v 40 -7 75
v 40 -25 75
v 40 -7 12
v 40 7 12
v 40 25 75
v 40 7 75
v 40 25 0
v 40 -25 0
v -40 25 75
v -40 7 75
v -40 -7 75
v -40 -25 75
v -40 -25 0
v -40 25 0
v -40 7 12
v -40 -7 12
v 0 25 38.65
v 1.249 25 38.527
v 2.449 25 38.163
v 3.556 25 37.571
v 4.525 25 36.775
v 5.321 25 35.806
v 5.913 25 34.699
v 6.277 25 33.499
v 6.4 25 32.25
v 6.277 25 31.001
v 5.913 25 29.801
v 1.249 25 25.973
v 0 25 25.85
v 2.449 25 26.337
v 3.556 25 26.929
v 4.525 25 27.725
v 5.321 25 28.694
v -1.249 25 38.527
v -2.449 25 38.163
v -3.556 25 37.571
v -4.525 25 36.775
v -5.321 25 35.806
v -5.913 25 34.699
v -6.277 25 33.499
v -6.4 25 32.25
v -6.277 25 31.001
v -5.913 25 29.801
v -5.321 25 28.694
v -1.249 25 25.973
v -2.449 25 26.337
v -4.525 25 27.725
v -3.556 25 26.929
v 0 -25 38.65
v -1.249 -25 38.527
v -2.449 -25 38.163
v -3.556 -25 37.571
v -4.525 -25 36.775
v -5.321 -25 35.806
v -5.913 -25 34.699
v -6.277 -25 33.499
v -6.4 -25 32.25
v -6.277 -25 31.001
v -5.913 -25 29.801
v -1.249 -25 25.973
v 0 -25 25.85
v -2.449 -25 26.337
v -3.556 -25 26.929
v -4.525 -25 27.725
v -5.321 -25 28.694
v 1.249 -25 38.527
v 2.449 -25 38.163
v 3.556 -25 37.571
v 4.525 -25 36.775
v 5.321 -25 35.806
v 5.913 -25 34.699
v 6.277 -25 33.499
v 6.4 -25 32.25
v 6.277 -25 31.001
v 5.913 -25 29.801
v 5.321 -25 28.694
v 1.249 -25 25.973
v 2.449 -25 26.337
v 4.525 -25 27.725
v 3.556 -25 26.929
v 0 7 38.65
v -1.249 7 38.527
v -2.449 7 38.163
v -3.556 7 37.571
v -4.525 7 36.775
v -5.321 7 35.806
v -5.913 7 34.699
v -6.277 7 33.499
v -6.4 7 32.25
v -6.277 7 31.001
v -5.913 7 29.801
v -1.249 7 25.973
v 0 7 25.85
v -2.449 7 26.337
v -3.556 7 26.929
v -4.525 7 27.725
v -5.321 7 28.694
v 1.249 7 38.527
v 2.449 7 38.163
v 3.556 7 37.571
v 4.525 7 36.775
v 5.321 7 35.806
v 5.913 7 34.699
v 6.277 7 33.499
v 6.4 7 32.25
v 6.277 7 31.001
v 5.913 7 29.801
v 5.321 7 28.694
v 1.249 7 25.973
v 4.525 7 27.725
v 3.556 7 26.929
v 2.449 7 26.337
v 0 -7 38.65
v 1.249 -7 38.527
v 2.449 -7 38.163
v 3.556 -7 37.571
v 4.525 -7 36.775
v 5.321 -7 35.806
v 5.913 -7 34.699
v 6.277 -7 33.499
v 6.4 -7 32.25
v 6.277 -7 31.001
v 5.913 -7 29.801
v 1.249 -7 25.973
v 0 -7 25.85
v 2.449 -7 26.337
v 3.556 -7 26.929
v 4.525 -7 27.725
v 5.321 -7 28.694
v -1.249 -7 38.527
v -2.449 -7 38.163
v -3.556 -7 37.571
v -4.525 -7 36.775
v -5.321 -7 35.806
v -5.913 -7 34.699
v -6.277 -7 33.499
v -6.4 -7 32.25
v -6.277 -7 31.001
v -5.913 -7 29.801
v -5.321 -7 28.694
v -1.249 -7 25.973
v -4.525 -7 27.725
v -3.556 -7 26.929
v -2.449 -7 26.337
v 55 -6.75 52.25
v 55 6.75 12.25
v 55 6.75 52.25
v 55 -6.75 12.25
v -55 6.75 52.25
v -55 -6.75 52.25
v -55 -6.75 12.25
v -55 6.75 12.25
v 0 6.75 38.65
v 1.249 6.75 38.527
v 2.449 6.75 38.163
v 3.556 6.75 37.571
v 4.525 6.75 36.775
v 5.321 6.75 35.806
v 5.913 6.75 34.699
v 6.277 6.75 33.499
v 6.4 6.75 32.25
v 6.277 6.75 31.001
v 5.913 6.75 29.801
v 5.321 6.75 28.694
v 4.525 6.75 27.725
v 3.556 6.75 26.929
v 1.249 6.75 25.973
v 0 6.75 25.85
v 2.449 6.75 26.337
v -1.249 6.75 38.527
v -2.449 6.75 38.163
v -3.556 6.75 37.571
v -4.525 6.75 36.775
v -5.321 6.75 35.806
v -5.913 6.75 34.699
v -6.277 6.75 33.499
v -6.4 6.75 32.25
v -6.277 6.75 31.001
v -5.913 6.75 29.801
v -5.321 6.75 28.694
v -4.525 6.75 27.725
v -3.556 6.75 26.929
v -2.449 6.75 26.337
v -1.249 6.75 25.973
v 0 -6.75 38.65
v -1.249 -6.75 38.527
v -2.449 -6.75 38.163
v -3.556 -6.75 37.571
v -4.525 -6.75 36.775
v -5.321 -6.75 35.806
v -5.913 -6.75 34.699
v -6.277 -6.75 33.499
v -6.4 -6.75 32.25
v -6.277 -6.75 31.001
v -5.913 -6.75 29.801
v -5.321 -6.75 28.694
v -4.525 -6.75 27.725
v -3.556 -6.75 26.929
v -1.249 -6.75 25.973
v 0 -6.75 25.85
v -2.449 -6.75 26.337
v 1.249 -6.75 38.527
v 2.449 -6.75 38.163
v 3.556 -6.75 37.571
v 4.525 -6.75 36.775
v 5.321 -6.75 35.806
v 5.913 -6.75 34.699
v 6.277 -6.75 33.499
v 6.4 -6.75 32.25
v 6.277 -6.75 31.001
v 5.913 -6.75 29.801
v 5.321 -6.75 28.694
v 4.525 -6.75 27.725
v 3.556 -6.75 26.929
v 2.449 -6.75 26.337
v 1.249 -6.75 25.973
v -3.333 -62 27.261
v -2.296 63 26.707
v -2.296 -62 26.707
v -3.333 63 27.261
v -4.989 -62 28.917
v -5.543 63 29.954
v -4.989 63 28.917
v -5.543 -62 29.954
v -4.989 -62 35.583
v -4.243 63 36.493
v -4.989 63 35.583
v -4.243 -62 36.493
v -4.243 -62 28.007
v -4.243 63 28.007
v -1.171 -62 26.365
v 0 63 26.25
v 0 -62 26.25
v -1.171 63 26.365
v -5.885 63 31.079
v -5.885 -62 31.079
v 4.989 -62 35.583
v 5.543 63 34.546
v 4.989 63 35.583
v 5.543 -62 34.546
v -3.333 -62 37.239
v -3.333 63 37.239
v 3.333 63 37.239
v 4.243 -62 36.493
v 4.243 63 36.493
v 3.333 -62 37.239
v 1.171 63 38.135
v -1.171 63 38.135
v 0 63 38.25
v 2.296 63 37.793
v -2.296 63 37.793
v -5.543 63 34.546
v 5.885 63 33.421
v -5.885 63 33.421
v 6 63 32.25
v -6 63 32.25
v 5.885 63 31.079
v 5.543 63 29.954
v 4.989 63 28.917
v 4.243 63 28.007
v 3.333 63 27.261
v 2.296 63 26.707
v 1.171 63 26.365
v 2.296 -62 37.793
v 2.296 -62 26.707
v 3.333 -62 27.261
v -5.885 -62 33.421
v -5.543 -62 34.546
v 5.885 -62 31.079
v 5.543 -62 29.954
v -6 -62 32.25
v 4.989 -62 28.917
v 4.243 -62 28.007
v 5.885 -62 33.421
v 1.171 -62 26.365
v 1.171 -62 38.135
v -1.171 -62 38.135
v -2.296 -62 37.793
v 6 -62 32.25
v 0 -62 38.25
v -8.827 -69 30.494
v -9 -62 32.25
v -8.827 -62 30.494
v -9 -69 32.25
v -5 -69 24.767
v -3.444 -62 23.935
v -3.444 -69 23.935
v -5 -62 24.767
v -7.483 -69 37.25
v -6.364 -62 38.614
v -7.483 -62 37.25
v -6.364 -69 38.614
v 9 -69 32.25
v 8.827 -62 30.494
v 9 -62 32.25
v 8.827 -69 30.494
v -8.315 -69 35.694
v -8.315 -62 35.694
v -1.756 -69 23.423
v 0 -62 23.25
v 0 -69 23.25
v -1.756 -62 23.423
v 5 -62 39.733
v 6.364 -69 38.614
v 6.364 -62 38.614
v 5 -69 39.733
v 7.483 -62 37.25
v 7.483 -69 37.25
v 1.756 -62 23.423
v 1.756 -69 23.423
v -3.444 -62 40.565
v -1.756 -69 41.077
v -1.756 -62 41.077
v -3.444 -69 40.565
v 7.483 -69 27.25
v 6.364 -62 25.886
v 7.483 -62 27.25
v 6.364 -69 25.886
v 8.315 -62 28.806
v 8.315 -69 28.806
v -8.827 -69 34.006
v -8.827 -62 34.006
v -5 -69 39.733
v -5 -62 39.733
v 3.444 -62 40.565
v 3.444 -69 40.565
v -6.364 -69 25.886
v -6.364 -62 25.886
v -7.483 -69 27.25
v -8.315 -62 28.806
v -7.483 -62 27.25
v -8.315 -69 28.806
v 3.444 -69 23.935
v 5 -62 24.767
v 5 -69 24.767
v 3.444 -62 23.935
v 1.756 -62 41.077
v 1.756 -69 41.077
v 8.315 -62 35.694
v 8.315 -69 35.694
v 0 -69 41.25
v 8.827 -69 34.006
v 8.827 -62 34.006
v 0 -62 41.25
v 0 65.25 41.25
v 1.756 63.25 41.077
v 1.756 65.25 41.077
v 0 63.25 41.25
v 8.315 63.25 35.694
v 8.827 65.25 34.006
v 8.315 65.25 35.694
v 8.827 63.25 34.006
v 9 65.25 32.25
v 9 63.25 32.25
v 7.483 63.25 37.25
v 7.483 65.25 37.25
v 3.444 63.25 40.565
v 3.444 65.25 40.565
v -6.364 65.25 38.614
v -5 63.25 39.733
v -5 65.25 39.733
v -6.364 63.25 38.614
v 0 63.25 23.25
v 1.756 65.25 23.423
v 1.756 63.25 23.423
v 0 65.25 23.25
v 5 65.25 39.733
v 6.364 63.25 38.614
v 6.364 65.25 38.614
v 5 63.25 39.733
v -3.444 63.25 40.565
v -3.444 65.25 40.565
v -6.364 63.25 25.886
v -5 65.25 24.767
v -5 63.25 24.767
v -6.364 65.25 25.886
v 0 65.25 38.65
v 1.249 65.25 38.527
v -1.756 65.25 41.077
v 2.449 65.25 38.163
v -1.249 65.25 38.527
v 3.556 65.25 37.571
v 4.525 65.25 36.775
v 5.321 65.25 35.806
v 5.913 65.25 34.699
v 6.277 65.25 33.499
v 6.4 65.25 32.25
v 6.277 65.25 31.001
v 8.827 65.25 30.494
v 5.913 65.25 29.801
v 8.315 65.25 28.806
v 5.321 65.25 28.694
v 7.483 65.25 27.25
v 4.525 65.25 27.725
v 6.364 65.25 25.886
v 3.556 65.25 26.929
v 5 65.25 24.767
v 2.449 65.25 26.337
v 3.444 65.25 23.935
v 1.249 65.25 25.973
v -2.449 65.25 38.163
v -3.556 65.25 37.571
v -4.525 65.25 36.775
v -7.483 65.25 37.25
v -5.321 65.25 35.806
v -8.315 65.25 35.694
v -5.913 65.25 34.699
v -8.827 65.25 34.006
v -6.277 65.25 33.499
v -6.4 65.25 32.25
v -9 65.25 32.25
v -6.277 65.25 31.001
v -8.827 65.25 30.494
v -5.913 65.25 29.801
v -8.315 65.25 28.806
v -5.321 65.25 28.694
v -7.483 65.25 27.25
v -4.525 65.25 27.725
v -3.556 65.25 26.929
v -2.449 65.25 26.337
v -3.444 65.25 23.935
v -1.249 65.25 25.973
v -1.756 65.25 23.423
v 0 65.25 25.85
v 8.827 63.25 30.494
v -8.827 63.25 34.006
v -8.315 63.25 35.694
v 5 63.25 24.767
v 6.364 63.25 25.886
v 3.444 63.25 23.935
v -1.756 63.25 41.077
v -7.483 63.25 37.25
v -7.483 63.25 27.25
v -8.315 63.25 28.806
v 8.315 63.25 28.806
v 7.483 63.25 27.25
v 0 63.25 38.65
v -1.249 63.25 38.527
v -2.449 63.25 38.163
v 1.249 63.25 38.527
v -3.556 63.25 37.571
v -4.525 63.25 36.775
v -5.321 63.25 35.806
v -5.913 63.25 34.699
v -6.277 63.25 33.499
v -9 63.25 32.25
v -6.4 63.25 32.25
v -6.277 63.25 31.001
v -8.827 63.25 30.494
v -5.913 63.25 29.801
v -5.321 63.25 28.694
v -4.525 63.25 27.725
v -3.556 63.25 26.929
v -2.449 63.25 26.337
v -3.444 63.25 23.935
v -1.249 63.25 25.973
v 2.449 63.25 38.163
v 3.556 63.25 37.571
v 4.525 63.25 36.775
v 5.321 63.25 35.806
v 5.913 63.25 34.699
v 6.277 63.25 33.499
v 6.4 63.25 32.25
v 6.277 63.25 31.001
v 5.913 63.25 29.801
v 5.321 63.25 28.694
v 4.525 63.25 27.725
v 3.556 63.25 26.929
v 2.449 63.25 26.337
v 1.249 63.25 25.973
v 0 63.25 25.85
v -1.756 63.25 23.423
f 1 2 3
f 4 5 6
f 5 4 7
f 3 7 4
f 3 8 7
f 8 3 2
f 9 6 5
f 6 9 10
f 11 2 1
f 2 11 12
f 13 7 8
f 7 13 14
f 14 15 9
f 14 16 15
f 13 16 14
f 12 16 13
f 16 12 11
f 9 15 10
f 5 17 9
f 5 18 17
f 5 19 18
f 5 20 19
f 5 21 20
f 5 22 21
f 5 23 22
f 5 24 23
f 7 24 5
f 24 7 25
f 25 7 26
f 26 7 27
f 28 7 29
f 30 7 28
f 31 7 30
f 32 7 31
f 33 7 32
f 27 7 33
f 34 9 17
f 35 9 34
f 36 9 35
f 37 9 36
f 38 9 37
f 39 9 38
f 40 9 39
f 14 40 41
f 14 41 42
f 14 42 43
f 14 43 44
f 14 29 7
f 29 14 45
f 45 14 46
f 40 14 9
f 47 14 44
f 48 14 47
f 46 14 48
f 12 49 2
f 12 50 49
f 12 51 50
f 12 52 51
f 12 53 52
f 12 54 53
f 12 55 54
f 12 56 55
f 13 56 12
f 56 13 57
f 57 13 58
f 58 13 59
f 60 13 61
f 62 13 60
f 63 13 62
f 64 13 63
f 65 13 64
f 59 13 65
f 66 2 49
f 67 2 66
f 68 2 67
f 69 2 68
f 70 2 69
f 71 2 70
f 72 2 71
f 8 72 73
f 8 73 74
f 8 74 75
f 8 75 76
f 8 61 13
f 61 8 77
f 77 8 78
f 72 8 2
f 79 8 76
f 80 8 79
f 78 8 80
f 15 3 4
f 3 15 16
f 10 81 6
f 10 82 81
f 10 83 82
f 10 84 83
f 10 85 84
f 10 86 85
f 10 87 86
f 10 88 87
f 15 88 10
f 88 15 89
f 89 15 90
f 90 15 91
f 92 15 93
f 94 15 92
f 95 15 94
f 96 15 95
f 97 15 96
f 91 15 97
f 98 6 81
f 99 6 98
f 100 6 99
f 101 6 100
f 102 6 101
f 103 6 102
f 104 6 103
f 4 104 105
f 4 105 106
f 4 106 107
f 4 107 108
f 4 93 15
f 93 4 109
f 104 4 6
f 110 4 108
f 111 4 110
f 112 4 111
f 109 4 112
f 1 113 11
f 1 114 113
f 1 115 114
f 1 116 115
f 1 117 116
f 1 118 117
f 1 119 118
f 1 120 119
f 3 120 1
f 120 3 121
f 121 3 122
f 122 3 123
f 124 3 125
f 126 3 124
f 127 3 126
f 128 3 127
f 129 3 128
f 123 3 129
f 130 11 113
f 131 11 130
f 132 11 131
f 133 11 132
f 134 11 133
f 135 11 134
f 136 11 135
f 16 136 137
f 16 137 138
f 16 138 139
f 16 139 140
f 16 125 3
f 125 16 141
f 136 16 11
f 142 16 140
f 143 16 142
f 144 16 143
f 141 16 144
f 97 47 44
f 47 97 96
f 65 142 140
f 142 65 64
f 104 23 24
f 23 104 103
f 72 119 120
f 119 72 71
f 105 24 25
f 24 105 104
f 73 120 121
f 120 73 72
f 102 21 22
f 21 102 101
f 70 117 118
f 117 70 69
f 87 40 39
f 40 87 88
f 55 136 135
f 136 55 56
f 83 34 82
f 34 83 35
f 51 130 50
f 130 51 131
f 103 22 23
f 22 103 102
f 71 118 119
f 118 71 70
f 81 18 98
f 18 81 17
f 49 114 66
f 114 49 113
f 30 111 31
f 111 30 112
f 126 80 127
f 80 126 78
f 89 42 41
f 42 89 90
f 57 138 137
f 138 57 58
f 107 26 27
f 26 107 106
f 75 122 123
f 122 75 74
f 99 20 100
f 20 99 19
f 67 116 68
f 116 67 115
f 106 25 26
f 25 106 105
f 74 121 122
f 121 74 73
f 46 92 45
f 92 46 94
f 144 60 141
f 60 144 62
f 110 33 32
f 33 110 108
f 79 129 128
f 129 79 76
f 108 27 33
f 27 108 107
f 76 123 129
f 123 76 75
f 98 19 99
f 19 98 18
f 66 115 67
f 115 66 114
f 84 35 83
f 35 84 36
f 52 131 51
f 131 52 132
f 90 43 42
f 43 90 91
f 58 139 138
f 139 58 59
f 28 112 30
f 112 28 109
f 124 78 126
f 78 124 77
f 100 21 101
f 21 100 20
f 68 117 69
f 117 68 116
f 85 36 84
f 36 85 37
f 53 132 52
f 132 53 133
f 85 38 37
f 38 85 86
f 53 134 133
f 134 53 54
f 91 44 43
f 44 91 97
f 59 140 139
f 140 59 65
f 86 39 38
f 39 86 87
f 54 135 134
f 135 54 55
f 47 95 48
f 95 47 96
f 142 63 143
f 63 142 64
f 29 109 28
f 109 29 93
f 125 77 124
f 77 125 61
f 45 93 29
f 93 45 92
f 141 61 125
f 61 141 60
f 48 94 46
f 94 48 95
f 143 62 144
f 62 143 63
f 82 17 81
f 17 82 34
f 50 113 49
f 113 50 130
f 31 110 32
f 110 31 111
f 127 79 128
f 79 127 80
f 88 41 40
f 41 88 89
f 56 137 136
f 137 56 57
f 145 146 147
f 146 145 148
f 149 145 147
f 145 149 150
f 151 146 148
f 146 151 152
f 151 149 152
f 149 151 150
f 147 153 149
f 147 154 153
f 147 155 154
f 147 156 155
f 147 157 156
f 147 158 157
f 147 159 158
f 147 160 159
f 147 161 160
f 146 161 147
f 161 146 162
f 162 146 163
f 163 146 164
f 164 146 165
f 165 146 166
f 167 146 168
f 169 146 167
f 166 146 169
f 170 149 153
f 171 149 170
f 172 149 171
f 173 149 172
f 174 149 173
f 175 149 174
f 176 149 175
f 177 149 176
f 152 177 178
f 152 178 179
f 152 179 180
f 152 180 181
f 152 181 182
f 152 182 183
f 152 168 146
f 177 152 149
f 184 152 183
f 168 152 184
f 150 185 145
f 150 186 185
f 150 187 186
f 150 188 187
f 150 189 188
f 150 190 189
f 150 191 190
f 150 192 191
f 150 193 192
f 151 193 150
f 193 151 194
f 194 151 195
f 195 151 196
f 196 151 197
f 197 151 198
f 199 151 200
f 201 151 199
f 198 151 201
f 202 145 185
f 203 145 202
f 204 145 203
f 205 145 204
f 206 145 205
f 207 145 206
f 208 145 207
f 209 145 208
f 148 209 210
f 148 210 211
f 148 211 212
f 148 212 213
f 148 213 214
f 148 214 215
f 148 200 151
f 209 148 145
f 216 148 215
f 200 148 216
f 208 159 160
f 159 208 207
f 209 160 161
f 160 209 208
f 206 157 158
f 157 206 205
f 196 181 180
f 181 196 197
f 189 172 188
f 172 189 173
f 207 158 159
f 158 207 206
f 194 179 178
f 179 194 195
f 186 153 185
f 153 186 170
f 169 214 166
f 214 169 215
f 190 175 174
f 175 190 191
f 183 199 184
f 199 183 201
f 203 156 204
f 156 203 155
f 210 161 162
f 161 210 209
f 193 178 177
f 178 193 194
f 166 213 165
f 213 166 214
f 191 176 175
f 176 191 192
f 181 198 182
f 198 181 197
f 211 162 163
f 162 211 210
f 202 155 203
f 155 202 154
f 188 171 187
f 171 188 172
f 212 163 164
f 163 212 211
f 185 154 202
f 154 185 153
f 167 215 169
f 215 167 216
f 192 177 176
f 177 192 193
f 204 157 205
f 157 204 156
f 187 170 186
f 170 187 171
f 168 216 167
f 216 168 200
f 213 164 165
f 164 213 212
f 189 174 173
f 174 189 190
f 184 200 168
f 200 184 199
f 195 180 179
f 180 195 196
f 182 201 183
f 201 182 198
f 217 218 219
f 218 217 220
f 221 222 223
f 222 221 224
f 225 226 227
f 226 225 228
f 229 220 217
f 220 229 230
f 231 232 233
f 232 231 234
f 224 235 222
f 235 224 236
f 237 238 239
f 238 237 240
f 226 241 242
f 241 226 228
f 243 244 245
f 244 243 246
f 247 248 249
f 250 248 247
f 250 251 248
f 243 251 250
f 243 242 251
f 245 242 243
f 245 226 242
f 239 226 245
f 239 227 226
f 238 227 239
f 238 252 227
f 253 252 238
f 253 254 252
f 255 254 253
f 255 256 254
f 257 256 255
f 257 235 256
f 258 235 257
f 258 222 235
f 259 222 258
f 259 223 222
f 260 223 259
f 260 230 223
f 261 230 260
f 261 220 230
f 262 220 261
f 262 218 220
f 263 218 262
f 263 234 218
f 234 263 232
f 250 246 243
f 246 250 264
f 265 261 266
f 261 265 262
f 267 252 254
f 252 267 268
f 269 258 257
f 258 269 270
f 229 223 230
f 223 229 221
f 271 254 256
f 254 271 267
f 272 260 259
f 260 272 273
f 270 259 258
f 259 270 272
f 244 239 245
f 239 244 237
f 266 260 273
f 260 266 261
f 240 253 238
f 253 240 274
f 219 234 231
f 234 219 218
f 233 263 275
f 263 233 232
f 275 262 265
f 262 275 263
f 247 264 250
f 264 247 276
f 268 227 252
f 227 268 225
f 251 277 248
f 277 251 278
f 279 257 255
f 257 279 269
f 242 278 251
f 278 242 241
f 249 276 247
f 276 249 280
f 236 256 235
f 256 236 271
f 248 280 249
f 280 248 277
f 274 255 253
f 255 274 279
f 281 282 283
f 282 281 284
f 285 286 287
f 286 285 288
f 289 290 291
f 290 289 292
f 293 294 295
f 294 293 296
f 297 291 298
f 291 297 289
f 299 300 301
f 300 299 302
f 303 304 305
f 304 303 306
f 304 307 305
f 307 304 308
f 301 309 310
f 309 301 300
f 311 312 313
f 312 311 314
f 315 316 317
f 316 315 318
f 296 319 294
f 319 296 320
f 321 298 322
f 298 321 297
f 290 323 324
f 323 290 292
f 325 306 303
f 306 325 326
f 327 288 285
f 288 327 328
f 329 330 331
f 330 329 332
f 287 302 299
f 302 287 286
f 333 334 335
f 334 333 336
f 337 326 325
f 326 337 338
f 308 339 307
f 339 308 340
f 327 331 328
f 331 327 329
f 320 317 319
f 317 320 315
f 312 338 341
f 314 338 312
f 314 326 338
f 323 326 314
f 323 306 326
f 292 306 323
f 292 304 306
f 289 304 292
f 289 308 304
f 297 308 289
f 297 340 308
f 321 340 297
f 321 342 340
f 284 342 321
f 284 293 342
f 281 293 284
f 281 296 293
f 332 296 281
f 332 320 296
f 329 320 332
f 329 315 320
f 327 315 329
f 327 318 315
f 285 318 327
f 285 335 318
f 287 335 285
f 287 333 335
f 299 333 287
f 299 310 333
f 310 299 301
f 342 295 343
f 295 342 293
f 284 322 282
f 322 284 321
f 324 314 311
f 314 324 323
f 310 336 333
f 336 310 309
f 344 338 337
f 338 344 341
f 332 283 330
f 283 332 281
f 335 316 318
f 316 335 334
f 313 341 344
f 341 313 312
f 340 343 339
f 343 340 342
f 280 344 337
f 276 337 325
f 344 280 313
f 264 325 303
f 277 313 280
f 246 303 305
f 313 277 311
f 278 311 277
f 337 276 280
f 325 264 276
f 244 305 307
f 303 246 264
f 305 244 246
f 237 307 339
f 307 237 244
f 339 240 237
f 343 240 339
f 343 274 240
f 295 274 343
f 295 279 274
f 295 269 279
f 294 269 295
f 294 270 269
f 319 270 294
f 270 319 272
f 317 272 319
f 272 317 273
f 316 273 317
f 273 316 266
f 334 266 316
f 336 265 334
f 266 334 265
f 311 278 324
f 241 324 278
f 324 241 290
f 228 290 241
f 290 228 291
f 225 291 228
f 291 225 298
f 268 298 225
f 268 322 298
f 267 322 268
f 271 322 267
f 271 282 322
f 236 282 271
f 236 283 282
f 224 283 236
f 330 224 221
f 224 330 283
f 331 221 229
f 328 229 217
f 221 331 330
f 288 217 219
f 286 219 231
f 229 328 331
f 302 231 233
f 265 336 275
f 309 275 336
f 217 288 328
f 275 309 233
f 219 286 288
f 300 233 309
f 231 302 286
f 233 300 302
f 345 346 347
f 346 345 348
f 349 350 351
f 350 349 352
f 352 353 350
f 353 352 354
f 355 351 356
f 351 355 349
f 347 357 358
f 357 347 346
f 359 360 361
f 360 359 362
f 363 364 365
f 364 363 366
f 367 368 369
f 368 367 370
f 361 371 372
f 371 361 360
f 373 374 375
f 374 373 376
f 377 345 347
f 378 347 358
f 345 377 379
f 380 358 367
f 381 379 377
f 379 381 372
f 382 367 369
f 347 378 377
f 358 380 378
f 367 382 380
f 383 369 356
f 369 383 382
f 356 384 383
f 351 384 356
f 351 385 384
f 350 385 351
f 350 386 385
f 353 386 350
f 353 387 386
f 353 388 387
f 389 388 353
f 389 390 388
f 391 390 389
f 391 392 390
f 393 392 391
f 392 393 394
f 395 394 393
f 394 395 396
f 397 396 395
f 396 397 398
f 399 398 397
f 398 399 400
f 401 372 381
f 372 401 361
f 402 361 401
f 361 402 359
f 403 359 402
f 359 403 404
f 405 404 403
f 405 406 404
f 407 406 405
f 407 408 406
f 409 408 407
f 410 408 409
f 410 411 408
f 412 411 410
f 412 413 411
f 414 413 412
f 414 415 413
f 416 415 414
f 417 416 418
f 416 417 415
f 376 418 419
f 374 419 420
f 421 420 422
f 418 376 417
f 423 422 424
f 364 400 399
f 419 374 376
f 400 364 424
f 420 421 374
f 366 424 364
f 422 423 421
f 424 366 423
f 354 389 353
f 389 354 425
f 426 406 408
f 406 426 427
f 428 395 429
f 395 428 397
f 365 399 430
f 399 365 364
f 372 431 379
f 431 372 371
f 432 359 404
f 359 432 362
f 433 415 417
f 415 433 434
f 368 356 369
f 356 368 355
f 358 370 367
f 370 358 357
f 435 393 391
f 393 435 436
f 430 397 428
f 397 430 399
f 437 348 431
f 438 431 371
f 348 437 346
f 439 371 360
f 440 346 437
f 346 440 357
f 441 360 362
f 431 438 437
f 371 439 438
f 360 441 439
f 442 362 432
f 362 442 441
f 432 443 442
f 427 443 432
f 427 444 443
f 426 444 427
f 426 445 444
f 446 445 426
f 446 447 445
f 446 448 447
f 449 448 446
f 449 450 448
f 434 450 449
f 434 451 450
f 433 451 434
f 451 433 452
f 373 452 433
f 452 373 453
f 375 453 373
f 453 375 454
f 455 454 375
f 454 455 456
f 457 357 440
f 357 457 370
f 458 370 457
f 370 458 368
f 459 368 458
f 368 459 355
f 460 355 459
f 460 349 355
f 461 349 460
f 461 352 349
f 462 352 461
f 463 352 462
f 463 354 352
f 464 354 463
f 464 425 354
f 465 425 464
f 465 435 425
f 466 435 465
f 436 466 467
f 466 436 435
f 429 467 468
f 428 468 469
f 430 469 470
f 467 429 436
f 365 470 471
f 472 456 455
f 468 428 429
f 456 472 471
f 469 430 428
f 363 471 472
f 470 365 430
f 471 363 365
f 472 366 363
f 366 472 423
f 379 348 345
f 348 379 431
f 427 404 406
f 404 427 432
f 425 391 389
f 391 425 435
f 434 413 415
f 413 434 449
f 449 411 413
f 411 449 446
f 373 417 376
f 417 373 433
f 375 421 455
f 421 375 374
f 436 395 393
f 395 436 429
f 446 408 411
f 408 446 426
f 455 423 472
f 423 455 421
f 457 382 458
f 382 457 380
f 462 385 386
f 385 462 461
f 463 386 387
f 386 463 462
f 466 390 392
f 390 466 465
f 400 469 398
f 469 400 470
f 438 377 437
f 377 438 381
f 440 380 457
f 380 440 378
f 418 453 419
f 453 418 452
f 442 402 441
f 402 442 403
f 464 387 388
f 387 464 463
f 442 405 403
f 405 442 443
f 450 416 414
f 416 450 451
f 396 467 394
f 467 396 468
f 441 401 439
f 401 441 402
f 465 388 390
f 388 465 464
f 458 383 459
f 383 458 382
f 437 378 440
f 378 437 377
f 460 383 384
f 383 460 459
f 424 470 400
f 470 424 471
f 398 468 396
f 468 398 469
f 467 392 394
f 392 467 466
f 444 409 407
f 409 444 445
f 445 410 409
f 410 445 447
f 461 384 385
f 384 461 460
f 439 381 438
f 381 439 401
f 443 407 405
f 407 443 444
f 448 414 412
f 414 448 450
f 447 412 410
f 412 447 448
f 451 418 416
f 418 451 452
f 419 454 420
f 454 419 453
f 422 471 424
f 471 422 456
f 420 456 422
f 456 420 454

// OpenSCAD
$fn = 32;

// ------------------------------------------------------------------------
// Clevis joint: 80 mm clevis, pin d12
// Every part is its own module, assembly() places them once.
// ------------------------------------------------------------------------

// --- part 1 ---
module clevis() {
  difference() {
    translate([-40, -25, 0]) cube([80, 50, 75]);
    translate([-41, -7, 12]) cube([82, 14, 64]);
    translate([0, 0, 32.25]) rotate([90, 0, 0]) cylinder(h = 52, d = 12.8, center = true);
  }
}

// --- part 2 ---
module eye() {
  difference() {
    translate([-55, -6.75, 0]) cube([110, 13.5, 40]);
    translate([0, 0, 20]) rotate([90, 0, 0]) cylinder(h = 15.5, d = 12.8, center = true);
  }
}

// --- part 3 ---
module pin() {
  rotate([0, 90, 0]) cylinder(h = 126, d = 12, center = true);
  translate([-69, 0, 0]) rotate([0, 90, 0]) cylinder(h = 7, d = 18);
}

// --- part 4 ---
module retainer() {
  difference() {
      translate([0, 0, 0]) cylinder(h = 2, d = 18);
      translate([0, 0, -1]) cylinder(h = 4, d = 12.8);
    }
}

// --- assembly ---
module assembly() {
  translate([0, 0, 0]) rotate([0, 0, 0]) clevis();
  translate([0, 0, 12.25]) rotate([0, 0, 0]) eye();
  translate([0, 0, 32.25]) rotate([0, 0, 90]) pin();
  translate([0, 65.25, 32.25]) rotate([90, 0, 0]) retainer();
}

assembly();
